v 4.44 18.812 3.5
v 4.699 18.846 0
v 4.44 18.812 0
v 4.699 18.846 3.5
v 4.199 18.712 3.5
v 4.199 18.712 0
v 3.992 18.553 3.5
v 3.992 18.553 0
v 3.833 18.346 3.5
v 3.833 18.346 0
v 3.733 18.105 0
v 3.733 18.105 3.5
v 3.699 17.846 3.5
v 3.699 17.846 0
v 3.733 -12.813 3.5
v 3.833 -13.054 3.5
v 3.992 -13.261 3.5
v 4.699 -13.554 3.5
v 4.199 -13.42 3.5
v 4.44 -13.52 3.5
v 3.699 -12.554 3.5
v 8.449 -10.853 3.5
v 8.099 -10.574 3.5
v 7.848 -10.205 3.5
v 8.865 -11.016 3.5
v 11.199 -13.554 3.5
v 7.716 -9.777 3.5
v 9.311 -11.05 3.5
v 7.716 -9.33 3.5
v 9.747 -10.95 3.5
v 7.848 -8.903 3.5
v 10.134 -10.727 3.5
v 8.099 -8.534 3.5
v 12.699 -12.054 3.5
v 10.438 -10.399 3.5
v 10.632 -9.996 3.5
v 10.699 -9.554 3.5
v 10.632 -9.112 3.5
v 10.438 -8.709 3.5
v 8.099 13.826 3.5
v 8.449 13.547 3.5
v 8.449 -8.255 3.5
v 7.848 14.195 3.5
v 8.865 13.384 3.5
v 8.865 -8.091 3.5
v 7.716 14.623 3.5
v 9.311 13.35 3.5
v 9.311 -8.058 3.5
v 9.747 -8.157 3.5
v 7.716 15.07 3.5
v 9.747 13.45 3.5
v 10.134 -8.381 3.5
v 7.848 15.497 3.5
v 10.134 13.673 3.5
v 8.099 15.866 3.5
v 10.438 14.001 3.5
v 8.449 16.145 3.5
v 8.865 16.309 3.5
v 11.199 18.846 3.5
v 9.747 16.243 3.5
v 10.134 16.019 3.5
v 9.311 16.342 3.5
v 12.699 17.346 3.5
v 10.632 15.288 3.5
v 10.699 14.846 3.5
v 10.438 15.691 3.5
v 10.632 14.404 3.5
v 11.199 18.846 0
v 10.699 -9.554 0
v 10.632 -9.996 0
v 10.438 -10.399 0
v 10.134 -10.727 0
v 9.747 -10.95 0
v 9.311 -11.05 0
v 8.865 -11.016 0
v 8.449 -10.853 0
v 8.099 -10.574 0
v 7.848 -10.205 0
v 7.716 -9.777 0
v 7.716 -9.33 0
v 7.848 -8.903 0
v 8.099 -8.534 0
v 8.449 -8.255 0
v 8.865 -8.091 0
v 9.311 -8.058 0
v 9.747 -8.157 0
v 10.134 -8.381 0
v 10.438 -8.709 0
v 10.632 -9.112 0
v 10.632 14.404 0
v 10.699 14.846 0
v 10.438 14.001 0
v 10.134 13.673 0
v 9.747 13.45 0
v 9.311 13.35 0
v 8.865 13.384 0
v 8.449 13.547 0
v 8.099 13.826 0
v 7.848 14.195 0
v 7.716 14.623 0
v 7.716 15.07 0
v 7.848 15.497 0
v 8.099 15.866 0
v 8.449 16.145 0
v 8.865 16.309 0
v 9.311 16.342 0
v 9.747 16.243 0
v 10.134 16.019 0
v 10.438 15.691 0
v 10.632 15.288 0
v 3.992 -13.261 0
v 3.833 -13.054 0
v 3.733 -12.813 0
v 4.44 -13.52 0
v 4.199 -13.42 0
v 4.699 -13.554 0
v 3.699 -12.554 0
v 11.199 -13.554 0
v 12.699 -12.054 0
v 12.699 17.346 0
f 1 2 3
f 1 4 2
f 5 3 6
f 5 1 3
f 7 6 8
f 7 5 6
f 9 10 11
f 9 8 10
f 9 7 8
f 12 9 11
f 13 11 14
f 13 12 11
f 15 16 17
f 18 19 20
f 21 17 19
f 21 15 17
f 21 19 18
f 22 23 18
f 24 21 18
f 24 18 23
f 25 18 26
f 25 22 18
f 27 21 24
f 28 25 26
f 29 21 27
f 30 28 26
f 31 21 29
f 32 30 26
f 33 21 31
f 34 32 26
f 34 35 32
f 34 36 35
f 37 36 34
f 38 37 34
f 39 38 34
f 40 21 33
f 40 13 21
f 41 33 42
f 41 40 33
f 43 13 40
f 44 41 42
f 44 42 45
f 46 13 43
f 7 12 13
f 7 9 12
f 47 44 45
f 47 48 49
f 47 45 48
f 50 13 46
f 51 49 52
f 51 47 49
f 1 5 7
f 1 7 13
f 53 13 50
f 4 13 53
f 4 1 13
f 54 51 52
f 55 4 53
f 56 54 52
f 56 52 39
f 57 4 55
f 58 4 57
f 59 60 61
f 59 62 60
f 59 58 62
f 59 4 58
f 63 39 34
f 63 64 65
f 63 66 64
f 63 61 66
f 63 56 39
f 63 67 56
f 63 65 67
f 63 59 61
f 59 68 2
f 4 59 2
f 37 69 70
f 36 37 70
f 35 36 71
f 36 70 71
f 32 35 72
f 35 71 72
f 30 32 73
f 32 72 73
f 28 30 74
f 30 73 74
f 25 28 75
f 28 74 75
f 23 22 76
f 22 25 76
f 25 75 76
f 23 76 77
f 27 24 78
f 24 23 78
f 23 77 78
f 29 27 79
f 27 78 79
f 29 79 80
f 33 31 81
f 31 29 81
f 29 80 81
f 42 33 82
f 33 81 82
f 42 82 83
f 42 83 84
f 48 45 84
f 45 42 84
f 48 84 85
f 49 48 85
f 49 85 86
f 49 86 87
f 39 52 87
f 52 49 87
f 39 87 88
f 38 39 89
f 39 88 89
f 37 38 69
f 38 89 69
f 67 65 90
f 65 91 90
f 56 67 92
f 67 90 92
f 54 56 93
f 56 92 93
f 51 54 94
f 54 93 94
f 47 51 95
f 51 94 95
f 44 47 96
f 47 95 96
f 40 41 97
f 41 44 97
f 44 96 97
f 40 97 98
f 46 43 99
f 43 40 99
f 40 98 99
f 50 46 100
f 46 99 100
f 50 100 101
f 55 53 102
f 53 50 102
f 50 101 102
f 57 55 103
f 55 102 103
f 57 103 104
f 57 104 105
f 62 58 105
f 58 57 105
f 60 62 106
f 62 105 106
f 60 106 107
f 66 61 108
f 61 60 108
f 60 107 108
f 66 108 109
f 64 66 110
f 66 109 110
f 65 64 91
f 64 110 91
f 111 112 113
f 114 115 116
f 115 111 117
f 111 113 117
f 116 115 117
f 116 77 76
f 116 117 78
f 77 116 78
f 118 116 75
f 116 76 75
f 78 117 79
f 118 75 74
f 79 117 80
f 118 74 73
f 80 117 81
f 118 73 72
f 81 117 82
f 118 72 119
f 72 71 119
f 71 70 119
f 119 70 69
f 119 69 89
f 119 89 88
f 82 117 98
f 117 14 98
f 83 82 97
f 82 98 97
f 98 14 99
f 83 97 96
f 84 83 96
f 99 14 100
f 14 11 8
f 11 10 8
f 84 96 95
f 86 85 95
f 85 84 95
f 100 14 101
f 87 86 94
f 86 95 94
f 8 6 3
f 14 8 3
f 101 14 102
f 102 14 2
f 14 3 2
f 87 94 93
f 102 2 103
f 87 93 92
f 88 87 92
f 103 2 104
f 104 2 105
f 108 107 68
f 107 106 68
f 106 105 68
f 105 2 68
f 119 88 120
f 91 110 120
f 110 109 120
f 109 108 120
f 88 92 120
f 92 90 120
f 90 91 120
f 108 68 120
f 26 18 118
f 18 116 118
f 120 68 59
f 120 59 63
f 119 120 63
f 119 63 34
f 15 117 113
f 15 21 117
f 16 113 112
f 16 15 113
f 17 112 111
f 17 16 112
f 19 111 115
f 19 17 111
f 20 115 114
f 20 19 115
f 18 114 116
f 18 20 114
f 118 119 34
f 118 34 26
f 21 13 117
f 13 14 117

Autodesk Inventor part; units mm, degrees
ref_plane "YZ Plane" through (0, 0, 0) normal (1, 0, 0) x (0, 1, 0)
ref_plane "XZ Plane" through (0, 0, 0) normal (0, 1, 0) x (-1, 0, 0)
ref_plane "XY Plane" through (0, 0, 0) normal (0, 0, 1) x (1, 0, 0)
sketch "Szkic1" plane through (0, 0, 0) normal (0, 0, 1) x (1, 0, 0)
  circle A0 centre (9.199, -9.5538) radius 1.5
  circle A1 centre (9.199, 14.8462) radius 1.5
  line L0 (-3.801, -13.5538) -> (-5.301, -12.0538)
  line L1 (-3.801, -13.5538) -> (11.199, -13.5538)
  line L2 (12.699, -12.0538) -> (11.199, -13.5538)
  line L3 (12.699, 17.3462) -> (12.699, -12.0538)
  line L4 (11.199, 18.8462) -> (12.699, 17.3462)
  line L5 (11.199, 18.8462) -> (-3.801, 18.8462)
  line L6 (-5.301, 17.3462) -> (-3.801, 18.8462)
  line L7 (-5.301, 17.3462) -> (-5.301, -12.0538)
  circle A2 centre (0.699, -7.3538) radius 1.5
  circle A3 centre (0.699, 12.6462) radius 1.5
  line L8 (3.699, 18.8462) -> (3.699, -13.5538)
  point P0 (0, 0)
  point P1 (0, 0)
  dimension "d0" = 9
extrude "Wyciągnięcie proste1" add sketch "Szkic1" along normal blind 3.5 contours L8 L5 L4 L3 L2 L1
fillet "Zaokrąglenie1" radius 1 2 edges at (3.699, -13.5538, 1.75) (3.699, 18.8462, 1.75)
properties part number "3DP_ABS_E3D_Titan_Mounting_Plate_Spacer"
